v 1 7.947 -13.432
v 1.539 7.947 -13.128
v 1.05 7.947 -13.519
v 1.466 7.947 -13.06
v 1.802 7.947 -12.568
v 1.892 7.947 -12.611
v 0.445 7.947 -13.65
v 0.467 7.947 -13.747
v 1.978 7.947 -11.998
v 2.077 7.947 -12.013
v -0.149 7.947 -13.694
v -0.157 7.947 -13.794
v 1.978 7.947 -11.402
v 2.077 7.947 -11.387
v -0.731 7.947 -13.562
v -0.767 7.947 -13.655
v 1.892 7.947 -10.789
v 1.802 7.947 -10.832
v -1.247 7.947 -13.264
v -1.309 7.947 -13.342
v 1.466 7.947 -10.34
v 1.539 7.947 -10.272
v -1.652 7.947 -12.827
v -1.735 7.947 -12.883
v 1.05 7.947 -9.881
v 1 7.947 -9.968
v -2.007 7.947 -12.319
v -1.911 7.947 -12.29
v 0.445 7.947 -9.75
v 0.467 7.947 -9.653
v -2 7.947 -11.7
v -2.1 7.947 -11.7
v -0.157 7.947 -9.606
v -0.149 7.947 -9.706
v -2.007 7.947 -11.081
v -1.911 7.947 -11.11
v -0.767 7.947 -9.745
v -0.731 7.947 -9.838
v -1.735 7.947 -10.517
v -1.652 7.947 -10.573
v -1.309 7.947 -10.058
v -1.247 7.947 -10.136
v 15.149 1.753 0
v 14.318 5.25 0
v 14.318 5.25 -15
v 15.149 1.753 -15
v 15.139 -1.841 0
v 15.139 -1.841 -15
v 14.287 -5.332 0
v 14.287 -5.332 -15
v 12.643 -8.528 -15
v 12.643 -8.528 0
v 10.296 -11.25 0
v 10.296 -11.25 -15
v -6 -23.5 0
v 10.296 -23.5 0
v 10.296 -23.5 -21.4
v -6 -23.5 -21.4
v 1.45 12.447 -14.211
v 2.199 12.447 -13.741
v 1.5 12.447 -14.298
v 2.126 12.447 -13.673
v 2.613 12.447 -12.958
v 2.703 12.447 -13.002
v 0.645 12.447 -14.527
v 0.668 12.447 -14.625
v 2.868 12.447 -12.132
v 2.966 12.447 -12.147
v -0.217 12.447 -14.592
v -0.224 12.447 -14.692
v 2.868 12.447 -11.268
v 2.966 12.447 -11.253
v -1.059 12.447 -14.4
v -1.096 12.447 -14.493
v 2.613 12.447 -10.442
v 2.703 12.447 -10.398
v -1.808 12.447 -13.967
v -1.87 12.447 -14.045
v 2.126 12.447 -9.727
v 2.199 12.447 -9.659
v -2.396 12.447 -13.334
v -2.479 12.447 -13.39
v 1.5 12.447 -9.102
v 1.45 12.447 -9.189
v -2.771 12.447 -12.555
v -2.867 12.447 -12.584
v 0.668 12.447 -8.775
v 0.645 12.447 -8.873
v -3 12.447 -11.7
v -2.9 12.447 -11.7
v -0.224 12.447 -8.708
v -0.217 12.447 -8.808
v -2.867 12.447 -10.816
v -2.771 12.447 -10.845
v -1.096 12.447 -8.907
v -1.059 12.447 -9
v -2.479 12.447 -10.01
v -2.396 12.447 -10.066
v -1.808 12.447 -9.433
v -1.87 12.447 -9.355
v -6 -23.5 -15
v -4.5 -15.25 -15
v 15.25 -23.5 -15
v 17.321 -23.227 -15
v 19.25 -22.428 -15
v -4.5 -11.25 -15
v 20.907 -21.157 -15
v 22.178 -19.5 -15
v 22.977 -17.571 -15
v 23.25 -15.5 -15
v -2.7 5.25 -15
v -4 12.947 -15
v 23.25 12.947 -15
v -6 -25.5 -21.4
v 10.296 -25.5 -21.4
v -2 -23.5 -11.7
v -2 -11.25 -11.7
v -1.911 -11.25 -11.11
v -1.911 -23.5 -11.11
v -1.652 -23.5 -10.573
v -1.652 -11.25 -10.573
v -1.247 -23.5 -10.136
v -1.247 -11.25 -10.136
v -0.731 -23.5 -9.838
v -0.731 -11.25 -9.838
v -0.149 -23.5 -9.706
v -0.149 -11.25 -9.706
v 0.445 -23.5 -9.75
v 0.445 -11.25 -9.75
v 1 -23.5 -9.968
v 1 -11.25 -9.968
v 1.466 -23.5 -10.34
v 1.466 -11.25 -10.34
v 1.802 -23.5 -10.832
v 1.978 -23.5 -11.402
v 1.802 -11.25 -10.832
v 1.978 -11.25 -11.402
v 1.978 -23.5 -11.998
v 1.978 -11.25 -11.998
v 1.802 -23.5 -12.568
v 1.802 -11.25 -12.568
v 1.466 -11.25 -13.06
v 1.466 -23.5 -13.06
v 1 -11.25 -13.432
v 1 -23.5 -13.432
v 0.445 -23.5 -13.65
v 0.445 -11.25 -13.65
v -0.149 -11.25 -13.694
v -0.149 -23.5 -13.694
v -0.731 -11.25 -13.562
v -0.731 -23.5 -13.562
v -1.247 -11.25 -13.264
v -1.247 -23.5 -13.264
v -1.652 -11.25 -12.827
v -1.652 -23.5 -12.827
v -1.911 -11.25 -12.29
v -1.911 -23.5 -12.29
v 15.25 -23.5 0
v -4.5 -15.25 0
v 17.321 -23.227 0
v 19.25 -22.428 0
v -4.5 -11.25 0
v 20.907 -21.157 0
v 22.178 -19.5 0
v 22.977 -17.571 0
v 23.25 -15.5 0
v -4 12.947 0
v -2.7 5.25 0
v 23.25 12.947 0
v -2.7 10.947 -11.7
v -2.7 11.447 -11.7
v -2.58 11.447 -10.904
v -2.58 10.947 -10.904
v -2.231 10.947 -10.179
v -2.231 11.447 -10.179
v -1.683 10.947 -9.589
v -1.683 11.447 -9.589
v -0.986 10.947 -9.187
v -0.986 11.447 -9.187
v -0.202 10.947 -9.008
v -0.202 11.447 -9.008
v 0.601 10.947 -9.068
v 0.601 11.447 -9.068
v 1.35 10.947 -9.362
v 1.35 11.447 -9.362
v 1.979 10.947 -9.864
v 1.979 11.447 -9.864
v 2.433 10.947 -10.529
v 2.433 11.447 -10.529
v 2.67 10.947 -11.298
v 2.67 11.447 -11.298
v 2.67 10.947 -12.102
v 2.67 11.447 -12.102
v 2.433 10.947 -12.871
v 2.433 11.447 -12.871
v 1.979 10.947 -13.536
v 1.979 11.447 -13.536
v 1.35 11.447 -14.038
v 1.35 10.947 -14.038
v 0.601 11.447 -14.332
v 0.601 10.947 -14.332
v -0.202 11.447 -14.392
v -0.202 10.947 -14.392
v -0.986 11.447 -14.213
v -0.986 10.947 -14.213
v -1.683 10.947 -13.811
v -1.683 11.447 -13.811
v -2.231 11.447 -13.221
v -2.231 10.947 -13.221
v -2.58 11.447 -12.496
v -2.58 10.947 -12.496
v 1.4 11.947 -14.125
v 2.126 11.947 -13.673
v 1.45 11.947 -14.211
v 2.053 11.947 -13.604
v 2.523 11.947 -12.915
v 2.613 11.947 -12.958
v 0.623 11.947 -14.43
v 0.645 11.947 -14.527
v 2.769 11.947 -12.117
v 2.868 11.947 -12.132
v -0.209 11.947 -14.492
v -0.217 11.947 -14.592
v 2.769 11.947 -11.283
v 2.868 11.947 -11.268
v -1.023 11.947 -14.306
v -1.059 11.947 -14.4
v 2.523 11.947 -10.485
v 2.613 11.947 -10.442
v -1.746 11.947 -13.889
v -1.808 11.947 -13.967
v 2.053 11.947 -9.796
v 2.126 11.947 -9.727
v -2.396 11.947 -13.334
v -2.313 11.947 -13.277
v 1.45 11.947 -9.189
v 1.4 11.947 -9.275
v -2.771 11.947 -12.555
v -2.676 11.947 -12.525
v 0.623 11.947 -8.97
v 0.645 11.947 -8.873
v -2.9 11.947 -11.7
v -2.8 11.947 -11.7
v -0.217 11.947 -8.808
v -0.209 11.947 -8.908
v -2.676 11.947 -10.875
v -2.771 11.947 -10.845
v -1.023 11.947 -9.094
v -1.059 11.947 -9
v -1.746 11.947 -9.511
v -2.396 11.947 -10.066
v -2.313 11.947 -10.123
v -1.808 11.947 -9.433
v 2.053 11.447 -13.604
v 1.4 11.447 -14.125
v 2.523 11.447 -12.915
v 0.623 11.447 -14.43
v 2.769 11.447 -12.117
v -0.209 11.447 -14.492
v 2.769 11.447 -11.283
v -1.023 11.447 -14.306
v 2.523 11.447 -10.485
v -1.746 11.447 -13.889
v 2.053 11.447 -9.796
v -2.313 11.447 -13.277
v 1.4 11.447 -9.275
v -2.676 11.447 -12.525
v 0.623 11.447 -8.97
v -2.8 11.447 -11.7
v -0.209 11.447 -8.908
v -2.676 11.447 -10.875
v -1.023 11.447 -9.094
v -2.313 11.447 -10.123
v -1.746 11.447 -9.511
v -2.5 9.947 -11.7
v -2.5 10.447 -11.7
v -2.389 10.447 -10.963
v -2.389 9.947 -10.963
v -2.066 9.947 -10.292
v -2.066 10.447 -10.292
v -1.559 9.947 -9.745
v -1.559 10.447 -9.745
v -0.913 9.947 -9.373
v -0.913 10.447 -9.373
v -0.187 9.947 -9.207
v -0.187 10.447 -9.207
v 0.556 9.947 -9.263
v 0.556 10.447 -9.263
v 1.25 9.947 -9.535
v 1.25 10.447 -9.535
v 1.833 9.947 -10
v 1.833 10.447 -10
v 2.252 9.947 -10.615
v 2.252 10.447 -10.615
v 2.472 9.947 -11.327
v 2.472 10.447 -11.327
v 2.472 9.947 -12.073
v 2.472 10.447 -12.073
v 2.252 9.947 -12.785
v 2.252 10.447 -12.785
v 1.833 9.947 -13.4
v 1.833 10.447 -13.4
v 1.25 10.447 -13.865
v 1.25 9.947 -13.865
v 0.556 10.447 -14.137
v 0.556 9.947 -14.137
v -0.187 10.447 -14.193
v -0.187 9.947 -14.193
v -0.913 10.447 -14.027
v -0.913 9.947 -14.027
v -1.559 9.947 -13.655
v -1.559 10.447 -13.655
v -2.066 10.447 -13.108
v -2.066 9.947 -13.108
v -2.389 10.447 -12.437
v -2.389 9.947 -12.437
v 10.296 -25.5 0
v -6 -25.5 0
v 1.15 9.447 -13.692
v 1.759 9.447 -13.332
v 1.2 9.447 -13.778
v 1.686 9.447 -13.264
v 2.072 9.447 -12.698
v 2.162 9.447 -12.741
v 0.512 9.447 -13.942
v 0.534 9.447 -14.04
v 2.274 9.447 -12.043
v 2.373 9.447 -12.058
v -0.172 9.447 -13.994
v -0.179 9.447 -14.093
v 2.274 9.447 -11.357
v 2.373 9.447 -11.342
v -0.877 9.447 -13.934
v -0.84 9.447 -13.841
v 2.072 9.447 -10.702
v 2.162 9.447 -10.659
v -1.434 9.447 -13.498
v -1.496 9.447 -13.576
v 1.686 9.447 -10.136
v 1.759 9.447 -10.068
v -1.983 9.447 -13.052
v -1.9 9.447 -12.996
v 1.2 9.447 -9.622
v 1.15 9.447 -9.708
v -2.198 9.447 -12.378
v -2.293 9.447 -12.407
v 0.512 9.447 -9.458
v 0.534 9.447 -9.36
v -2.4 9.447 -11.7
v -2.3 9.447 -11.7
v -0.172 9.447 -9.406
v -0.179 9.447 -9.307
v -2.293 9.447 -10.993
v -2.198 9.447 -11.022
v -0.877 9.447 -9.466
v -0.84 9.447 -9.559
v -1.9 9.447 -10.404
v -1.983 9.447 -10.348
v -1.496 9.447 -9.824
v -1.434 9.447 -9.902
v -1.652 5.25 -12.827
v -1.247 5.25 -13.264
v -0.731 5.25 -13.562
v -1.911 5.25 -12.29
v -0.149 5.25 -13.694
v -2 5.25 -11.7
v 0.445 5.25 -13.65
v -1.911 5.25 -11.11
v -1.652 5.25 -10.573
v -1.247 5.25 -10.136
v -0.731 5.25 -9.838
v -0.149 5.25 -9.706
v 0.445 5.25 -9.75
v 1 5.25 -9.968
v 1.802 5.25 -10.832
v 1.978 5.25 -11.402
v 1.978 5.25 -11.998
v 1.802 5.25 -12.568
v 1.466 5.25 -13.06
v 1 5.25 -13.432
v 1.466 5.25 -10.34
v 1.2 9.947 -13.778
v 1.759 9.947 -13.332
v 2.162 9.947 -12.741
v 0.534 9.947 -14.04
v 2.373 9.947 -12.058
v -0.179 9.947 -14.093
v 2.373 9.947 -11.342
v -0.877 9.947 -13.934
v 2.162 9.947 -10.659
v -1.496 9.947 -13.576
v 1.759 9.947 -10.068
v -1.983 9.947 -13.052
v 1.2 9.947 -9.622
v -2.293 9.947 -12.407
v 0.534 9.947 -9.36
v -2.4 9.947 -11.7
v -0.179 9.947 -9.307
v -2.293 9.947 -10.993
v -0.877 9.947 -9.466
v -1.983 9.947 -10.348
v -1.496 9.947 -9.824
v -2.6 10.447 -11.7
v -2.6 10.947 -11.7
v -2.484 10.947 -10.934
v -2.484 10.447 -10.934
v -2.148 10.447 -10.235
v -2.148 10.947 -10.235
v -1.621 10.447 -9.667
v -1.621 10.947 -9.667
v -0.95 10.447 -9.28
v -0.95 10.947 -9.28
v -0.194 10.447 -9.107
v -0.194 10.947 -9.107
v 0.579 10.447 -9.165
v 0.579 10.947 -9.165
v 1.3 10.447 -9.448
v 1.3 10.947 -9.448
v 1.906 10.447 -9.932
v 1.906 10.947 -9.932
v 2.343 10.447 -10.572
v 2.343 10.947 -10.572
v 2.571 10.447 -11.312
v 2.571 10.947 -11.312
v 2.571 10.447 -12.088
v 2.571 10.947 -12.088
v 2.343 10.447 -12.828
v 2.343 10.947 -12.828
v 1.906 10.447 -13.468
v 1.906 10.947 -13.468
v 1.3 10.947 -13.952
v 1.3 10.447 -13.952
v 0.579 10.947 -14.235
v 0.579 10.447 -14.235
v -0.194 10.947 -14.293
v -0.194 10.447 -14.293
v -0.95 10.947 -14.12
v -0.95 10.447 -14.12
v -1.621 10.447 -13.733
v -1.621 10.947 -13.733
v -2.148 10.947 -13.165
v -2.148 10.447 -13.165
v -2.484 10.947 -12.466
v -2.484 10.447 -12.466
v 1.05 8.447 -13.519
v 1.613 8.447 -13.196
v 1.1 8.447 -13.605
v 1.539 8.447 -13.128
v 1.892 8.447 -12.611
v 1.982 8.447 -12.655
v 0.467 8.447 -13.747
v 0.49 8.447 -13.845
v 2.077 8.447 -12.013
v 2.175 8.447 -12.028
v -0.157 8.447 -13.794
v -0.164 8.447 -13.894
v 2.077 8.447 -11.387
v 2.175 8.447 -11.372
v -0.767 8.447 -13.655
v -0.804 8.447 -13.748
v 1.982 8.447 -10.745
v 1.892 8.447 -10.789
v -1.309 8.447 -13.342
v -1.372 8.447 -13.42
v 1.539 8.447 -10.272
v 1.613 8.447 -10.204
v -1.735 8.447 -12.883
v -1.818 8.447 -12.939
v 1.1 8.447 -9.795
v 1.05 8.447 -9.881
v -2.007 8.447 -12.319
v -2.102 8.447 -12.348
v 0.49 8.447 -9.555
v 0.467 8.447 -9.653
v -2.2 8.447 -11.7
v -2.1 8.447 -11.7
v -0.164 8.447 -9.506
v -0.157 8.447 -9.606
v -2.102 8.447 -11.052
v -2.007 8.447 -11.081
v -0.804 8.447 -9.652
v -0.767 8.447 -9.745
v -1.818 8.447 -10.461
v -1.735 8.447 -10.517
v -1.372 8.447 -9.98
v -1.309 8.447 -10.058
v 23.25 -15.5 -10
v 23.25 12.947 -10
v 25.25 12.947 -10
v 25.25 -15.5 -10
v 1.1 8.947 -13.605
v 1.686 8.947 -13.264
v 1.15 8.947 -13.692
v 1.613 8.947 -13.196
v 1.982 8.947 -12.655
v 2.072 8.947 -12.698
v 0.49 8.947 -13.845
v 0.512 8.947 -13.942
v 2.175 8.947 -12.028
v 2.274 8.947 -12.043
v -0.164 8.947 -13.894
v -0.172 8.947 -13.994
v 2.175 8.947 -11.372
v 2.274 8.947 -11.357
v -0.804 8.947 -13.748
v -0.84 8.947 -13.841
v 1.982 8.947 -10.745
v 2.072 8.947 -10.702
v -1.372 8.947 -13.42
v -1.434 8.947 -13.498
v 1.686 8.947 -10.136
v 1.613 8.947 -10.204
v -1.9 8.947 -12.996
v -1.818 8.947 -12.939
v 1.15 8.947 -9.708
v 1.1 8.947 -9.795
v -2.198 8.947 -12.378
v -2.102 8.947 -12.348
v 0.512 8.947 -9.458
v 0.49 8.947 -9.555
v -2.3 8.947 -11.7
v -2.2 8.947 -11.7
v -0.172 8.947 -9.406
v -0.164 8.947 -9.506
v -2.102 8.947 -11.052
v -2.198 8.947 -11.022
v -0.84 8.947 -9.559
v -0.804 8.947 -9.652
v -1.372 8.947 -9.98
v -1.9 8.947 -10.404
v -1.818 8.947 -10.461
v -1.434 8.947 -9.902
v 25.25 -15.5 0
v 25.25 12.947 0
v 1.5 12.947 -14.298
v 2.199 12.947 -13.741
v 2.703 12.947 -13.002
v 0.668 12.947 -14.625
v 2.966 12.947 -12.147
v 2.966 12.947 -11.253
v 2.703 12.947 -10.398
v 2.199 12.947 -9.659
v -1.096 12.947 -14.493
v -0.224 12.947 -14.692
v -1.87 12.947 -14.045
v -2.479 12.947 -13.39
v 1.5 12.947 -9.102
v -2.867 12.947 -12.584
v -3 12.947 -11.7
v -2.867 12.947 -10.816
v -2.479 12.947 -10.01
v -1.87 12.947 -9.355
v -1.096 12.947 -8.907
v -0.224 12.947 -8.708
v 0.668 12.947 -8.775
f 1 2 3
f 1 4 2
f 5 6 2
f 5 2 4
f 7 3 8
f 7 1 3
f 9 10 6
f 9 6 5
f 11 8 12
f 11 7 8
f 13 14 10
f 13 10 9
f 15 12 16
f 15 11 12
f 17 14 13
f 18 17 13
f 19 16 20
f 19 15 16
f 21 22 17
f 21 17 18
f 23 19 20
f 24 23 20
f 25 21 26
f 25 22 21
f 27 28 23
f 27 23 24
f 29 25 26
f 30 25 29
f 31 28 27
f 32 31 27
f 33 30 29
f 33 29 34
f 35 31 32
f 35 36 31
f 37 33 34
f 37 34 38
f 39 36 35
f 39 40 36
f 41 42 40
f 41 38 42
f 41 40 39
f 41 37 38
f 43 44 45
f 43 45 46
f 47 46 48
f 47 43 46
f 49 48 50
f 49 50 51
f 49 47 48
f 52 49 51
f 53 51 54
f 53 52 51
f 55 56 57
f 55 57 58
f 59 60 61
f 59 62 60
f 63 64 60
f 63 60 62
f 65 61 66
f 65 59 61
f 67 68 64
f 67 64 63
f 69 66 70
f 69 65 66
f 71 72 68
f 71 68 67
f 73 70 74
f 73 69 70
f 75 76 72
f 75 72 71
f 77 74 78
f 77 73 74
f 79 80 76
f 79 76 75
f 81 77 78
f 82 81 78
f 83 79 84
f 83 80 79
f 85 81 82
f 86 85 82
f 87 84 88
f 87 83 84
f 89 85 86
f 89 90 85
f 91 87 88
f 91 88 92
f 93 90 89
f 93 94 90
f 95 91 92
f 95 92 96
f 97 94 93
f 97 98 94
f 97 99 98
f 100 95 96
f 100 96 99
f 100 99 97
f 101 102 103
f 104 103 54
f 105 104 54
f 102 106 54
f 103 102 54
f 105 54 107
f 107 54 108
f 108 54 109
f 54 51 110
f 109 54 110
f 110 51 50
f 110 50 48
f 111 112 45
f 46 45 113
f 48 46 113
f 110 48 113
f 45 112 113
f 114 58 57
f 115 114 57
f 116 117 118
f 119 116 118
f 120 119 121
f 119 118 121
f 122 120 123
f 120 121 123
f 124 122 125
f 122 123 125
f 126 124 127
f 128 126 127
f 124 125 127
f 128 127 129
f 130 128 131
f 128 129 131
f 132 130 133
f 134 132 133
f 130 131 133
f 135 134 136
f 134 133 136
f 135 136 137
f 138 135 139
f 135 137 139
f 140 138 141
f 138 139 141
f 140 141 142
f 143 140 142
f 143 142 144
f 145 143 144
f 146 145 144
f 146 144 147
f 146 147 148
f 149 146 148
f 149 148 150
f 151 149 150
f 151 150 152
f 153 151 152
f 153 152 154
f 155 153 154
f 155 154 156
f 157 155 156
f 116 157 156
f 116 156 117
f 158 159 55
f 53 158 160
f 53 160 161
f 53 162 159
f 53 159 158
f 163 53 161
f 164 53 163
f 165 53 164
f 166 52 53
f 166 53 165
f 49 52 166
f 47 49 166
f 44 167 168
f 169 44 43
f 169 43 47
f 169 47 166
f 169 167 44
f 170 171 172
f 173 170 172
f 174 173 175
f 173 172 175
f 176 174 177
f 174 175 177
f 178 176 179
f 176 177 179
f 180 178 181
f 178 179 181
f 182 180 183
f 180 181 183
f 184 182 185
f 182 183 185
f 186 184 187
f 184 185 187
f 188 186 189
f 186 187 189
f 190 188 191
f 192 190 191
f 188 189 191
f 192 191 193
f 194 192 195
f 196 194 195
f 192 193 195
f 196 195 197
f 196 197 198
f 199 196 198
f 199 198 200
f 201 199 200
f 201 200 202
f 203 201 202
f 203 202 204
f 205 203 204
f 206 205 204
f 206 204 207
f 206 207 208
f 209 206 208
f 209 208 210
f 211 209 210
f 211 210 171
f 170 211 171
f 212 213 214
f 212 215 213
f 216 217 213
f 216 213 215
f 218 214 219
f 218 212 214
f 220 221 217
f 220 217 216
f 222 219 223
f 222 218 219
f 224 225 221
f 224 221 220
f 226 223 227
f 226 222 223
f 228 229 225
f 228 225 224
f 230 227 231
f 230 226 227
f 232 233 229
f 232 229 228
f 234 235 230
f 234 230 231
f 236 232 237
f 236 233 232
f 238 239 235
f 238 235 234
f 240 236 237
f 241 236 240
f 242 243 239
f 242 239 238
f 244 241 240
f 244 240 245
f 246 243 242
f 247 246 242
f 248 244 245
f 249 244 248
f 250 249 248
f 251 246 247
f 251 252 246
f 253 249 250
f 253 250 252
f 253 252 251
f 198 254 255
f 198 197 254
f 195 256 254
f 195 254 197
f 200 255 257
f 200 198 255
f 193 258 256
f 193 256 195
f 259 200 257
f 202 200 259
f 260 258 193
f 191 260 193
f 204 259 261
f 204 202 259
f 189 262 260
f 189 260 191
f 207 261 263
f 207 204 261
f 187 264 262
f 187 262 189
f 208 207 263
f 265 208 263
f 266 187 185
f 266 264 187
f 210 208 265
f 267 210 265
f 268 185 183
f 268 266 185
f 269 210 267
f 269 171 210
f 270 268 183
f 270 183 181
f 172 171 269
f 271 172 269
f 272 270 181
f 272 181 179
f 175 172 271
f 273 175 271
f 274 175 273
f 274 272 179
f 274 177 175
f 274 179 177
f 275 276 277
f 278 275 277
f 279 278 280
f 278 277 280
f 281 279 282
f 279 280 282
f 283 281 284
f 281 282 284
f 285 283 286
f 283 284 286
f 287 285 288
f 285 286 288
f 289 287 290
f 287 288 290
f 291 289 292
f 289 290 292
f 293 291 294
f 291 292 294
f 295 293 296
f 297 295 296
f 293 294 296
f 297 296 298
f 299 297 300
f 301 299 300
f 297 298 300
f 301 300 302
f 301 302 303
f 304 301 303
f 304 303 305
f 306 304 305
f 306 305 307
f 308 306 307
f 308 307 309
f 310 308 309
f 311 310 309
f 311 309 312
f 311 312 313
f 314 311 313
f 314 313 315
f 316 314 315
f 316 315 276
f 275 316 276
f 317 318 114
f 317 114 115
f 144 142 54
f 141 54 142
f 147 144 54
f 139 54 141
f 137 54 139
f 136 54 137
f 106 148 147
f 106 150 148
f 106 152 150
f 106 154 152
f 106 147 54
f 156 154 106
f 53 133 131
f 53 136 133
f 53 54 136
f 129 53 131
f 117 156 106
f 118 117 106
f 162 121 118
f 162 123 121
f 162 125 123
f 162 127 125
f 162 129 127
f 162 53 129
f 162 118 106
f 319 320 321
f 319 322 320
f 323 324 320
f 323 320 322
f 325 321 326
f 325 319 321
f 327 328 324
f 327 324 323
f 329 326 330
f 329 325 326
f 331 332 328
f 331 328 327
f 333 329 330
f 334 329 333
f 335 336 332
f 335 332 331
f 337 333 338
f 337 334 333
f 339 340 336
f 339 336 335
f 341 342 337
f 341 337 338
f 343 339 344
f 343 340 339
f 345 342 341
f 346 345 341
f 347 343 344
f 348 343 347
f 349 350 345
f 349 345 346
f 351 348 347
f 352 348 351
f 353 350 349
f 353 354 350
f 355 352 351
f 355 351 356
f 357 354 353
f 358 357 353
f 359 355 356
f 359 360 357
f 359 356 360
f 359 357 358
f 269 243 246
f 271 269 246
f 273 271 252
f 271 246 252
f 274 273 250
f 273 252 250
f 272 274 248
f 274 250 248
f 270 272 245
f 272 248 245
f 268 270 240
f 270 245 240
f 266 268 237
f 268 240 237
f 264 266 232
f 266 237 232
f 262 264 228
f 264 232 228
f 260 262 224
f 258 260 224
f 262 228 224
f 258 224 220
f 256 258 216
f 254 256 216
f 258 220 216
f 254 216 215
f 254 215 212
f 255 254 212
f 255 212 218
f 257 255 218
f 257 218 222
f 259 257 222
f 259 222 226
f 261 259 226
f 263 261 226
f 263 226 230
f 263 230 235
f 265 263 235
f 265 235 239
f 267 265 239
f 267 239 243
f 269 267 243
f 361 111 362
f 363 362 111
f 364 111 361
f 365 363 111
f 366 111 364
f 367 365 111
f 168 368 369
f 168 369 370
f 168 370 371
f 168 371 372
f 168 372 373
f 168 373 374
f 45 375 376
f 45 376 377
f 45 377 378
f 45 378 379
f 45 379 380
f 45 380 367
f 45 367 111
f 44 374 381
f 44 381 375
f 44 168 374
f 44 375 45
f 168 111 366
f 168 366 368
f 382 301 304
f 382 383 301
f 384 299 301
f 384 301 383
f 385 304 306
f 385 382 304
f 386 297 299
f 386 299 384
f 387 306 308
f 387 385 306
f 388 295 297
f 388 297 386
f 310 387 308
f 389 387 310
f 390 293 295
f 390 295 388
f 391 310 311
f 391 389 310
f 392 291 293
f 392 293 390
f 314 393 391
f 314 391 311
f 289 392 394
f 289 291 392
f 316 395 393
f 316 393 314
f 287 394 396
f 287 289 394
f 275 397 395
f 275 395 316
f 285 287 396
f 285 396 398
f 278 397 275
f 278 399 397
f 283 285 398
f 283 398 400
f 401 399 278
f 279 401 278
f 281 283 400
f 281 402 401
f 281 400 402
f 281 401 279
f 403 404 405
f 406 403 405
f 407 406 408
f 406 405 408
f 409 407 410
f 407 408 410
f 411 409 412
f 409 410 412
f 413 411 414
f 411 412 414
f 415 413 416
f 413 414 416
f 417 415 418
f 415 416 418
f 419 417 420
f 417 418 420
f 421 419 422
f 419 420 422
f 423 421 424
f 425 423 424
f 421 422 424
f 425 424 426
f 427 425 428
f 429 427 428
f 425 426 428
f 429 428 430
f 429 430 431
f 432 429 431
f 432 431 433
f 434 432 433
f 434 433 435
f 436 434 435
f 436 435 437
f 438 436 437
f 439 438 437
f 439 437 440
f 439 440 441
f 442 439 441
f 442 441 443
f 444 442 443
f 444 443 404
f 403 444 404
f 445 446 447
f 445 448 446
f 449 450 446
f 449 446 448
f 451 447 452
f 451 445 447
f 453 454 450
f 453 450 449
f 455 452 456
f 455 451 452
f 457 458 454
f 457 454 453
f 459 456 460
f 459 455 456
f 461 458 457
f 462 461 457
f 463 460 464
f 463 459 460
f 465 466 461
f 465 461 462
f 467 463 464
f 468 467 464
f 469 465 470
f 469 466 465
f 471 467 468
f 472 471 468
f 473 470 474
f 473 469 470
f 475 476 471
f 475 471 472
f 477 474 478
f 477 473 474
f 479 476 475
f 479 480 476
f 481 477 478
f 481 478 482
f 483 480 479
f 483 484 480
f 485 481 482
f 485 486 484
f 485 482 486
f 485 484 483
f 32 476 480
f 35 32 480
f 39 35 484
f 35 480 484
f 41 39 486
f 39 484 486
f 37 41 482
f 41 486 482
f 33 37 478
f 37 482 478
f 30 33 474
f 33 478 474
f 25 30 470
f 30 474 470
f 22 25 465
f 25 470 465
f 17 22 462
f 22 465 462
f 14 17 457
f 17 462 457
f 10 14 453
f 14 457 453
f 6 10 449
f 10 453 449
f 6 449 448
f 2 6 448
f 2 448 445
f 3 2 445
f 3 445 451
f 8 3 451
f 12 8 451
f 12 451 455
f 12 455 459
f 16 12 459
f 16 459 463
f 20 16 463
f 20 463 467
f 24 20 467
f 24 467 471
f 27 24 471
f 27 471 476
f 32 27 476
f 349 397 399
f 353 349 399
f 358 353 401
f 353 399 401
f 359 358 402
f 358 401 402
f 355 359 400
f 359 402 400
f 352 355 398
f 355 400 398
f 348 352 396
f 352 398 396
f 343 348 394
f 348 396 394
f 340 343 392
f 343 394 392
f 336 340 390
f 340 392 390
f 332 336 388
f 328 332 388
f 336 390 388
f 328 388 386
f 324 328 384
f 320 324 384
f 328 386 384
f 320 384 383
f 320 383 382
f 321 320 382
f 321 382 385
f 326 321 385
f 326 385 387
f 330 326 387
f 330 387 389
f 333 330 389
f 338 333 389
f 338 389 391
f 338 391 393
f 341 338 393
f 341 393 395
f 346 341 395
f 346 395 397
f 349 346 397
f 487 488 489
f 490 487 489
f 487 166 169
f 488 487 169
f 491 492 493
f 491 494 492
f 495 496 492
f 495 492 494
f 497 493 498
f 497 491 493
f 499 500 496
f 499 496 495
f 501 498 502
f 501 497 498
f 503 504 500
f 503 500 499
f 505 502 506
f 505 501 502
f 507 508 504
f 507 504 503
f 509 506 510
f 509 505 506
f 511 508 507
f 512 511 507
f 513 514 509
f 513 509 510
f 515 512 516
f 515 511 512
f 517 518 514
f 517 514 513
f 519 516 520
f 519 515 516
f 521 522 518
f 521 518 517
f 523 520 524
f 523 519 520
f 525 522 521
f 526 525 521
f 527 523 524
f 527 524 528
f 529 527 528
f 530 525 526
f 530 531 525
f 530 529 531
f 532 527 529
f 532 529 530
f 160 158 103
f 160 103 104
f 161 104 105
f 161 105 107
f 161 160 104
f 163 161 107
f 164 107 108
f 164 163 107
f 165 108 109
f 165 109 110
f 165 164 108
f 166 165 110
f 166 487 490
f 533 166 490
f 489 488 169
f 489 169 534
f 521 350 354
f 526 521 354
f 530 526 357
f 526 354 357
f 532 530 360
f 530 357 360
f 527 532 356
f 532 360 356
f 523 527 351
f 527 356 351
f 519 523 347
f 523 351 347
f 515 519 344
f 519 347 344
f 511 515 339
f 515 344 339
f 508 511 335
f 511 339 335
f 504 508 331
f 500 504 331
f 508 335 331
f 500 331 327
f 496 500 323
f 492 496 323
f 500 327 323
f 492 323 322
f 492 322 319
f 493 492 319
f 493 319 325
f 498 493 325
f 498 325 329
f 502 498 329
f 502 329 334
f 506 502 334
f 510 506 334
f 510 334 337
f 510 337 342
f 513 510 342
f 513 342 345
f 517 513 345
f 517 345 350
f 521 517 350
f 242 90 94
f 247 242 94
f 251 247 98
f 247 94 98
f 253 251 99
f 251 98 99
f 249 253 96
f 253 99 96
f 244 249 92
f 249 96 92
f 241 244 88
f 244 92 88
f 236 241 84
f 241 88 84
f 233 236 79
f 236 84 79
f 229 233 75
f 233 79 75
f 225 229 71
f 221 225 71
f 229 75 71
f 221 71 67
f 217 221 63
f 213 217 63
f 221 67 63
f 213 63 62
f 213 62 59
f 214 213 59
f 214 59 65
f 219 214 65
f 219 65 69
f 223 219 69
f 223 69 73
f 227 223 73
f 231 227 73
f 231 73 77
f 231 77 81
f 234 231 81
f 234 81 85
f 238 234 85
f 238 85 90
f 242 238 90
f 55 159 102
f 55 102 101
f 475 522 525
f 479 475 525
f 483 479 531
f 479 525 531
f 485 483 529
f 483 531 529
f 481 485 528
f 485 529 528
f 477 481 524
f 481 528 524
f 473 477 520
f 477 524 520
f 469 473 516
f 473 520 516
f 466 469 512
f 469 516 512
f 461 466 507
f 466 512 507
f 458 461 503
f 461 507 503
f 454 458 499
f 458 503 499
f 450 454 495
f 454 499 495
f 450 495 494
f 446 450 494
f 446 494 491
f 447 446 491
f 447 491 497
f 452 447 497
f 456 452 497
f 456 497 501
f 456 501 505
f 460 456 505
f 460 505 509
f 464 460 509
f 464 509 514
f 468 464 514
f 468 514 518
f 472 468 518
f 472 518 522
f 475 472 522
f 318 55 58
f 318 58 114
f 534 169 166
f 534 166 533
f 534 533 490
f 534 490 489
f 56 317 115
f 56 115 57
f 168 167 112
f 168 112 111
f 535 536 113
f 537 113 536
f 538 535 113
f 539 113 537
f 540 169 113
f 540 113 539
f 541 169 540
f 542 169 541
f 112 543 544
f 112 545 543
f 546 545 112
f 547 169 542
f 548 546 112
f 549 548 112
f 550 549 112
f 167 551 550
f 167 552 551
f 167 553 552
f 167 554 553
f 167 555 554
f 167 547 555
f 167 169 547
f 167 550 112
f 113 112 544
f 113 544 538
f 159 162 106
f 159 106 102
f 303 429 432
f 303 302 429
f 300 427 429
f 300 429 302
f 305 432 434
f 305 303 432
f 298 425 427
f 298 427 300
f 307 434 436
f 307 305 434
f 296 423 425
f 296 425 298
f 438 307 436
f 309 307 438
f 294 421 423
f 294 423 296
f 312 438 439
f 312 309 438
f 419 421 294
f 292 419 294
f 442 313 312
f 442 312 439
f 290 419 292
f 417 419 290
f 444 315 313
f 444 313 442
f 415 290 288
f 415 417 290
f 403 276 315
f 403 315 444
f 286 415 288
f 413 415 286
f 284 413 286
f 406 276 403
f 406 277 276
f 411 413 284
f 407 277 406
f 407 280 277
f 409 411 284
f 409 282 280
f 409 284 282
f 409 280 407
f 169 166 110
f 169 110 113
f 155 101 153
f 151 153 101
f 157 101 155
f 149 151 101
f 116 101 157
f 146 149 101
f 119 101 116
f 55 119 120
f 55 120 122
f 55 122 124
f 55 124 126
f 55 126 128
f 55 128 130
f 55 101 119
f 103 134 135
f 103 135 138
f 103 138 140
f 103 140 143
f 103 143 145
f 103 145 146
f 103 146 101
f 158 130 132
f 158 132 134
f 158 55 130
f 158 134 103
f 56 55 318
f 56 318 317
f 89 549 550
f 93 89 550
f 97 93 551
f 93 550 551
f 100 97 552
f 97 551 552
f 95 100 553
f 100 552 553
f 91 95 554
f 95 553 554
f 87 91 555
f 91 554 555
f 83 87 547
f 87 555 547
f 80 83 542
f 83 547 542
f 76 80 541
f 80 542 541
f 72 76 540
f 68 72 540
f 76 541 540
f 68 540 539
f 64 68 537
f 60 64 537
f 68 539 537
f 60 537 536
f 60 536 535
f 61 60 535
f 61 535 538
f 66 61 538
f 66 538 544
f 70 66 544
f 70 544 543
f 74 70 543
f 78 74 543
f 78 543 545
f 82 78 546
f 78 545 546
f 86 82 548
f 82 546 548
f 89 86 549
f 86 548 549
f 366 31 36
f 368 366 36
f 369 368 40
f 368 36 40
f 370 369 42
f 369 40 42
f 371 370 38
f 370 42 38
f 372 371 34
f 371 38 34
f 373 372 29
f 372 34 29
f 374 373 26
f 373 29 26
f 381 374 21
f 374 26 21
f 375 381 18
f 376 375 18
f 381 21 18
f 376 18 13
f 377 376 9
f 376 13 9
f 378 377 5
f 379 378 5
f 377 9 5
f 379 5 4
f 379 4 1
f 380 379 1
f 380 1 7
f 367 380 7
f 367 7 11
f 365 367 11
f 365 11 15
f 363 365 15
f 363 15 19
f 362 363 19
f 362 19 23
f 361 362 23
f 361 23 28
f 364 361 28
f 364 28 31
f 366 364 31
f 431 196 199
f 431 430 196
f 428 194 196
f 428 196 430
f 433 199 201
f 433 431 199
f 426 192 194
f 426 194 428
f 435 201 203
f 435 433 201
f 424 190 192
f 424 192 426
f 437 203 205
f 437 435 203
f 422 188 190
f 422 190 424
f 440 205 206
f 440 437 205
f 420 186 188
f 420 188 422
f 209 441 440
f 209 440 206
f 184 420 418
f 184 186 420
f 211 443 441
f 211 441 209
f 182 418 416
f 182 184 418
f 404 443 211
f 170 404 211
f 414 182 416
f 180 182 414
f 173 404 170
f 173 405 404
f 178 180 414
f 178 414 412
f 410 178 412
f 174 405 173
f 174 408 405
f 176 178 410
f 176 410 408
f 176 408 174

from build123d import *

# Parameters (mm, degrees)
F0_W      = 2
F0_H      = 28.4474462867
F1_DEPTH  = 10
F2_DEPTH  = 21.4
F3_DEPTH  = 15
F4_R      = 2
F5_DEPTH  = 8
F4_R_2    = 2.1
F6_DEPTH  = 5
F4_R_3    = 2.2
F7_DEPTH  = 4.5
F4_R_4    = 2.3
F8_DEPTH  = 4
F4_R_5    = 2.4
F9_DEPTH  = 3.5
F4_R_6    = 2.5
F10_DEPTH = 3
F4_R_7    = 2.6
F11_DEPTH = 2.5
F4_R_8    = 2.7
F12_DEPTH = 2
F4_R_9    = 2.8
F13_DEPTH = 1.5
F4_R_10   = 2.9
F14_DEPTH = 1
F4_R_11   = 3
F15_DEPTH = 0.5
F16_R     = 2
F17_DEPTH = 15


with BuildPart() as f1:
    # F0 (on Top) → F1 (new body)
    with BuildSketch(Plane.XY):
        with Locations((24.25, -1.2762768567)):
            Rectangle(F0_W, F0_H)
    extrude(amount=-F1_DEPTH)


with BuildPart() as f2:
    # F0 (on Top) → F2 (new body)
    with BuildSketch(Plane.XY):
        Polygon((0, -23.5), (-6, -23.5), (-6, -25.5), (10.295630141, -25.5), (10.295630141, -23.5), align=None)
    extrude(amount=-F2_DEPTH)


with BuildPart() as f3:
    # F0 (on Top) → F3 (new body)
    with BuildSketch(Plane.XY):
        with BuildLine():
            ThreePointArc((10.295630141, -11.25), (5.5226805086, -14.2148689758), (0, -15.25))
            Line((0, -15.25), (-4.5, -15.25))
            Line((-4.5, -15.25), (-6, -23.5))
            Line((-6, -23.5), (0, -23.5))
            Line((0, -23.5), (10.295630141, -23.5))
            Line((10.295630141, -23.5), (15.25, -23.5))
            ThreePointArc((15.25, -23.5), (20.9068542495, -21.1568542495), (23.25, -15.5))
            Line((23.25, -15.5), (23.25, 12.9474462867))
            Line((23.25, 12.9474462867), (8.0576755118, 12.9474462867))
            ThreePointArc((8.0576755118, 12.9474462867), (11.8312459859, 9.6220641455), (14.3178210633, 5.25))
            ThreePointArc((14.3178210633, 5.25), (14.816139681, -3.611717729), (10.295630141, -11.25))
        make_face()
        with BuildLine():
            Line((-4.5, -15.25), (0, -15.25))
            ThreePointArc((0, -15.25), (5.5226805086, -14.2148689758), (10.295630141, -11.25))
            Line((10.295630141, -11.25), (0, -11.25))
            Line((0, -11.25), (-4.5, -13.75))
            Line((-4.5, -13.75), (-4.5, -15.25))
        make_face()
        with BuildLine():
            Line((2.7, 5.25), (14.3178210633, 5.25))
            ThreePointArc((14.3178210633, 5.25), (11.8312459859, 9.6220641455), (8.0576755118, 12.9474462867))
            Line((8.0576755118, 12.9474462867), (4, 12.9474462867))
            Line((4, 12.9474462867), (2.7, 5.25))
        make_face()
        Polygon((-2.7, 5.25), (2.7, 5.25), (4, 12.9474462867), (-4, 12.9474462867), align=None)
        Polygon((-4.5, -13.75), (0, -11.25), (-4.5, -11.25), align=None)
    extrude(amount=-F3_DEPTH)

    # F4 (on face) → F5 (cut)
    with BuildSketch(Plane(origin=(0, 12.9474462867, 0), x_dir=(-1, 0, 0), z_dir=(0, 1, 0))):
        with Locations((0, -11.7)):
            Circle(F4_R)
    extrude(amount=-F5_DEPTH, mode=Mode.SUBTRACT)

    # F4 (on face) → F6 (cut)
    with BuildSketch(Plane(origin=(0, 12.9474462867, 0), x_dir=(-1, 0, 0), z_dir=(0, 1, 0))):
        with Locations((0, -11.7)):
            Circle(F4_R_2)
        with Locations((0, -11.7)):
            Circle(F4_R, mode=Mode.SUBTRACT)
    extrude(amount=-F6_DEPTH, mode=Mode.SUBTRACT)

    # F4 (on face) → F7 (cut)
    with BuildSketch(Plane(origin=(0, 12.9474462867, 0), x_dir=(-1, 0, 0), z_dir=(0, 1, 0))):
        with Locations((0, -11.7)):
            Circle(F4_R_3)
        with Locations((0, -11.7)):
            Circle(F4_R_2, mode=Mode.SUBTRACT)
    extrude(amount=-F7_DEPTH, mode=Mode.SUBTRACT)

    # F4 (on face) → F8 (cut)
    with BuildSketch(Plane(origin=(0, 12.9474462867, 0), x_dir=(-1, 0, 0), z_dir=(0, 1, 0))):
        with Locations((0, -11.7)):
            Circle(F4_R_4)
        with Locations((0, -11.7)):
            Circle(F4_R_3, mode=Mode.SUBTRACT)
    extrude(amount=-F8_DEPTH, mode=Mode.SUBTRACT)

    # F4 (on face) → F9 (cut)
    with BuildSketch(Plane(origin=(0, 12.9474462867, 0), x_dir=(-1, 0, 0), z_dir=(0, 1, 0))):
        with Locations((0, -11.7)):
            Circle(F4_R_5)
        with Locations((0, -11.7)):
            Circle(F4_R_4, mode=Mode.SUBTRACT)
    extrude(amount=-F9_DEPTH, mode=Mode.SUBTRACT)

    # F4 (on face) → F10 (cut)
    with BuildSketch(Plane(origin=(0, 12.9474462867, 0), x_dir=(-1, 0, 0), z_dir=(0, 1, 0))):
        with Locations((0, -11.7)):
            Circle(F4_R_6)
        with Locations((0, -11.7)):
            Circle(F4_R_5, mode=Mode.SUBTRACT)
    extrude(amount=-F10_DEPTH, mode=Mode.SUBTRACT)

    # F4 (on face) → F11 (cut)
    with BuildSketch(Plane(origin=(0, 12.9474462867, 0), x_dir=(-1, 0, 0), z_dir=(0, 1, 0))):
        with Locations((0, -11.7)):
            Circle(F4_R_7)
        with Locations((0, -11.7)):
            Circle(F4_R_6, mode=Mode.SUBTRACT)
    extrude(amount=-F11_DEPTH, mode=Mode.SUBTRACT)

    # F4 (on face) → F12 (cut)
    with BuildSketch(Plane(origin=(0, 12.9474462867, 0), x_dir=(-1, 0, 0), z_dir=(0, 1, 0))):
        with Locations((0, -11.7)):
            Circle(F4_R_8)
        with Locations((0, -11.7)):
            Circle(F4_R_7, mode=Mode.SUBTRACT)
    extrude(amount=-F12_DEPTH, mode=Mode.SUBTRACT)

    # F4 (on face) → F13 (cut)
    with BuildSketch(Plane(origin=(0, 12.9474462867, 0), x_dir=(-1, 0, 0), z_dir=(0, 1, 0))):
        with Locations((0, -11.7)):
            Circle(F4_R_9)
        with Locations((0, -11.7)):
            Circle(F4_R_8, mode=Mode.SUBTRACT)
    extrude(amount=-F13_DEPTH, mode=Mode.SUBTRACT)

    # F4 (on face) → F14 (cut)
    with BuildSketch(Plane(origin=(0, 12.9474462867, 0), x_dir=(-1, 0, 0), z_dir=(0, 1, 0))):
        with Locations((0, -11.7)):
            Circle(F4_R_10)
        with Locations((0, -11.7)):
            Circle(F4_R_9, mode=Mode.SUBTRACT)
    extrude(amount=-F14_DEPTH, mode=Mode.SUBTRACT)

    # F4 (on face) → F15 (cut)
    with BuildSketch(Plane(origin=(0, 12.9474462867, 0), x_dir=(-1, 0, 0), z_dir=(0, 1, 0))):
        with Locations((0, -11.7)):
            Circle(F4_R_11)
        with Locations((0, -11.7)):
            Circle(F4_R_10, mode=Mode.SUBTRACT)
    extrude(amount=-F15_DEPTH, mode=Mode.SUBTRACT)

    # F16 (on face) → F17 (cut)
    with BuildSketch(Plane(origin=(0, -11.25, 0), x_dir=(-1, 0, 0), z_dir=(0, 1, 0))):
        with Locations((0, -11.7)):
            Circle(F16_R)
    extrude(amount=-F17_DEPTH, mode=Mode.SUBTRACT)


solid = Compound([f1.part, f2.part, f3.part])
